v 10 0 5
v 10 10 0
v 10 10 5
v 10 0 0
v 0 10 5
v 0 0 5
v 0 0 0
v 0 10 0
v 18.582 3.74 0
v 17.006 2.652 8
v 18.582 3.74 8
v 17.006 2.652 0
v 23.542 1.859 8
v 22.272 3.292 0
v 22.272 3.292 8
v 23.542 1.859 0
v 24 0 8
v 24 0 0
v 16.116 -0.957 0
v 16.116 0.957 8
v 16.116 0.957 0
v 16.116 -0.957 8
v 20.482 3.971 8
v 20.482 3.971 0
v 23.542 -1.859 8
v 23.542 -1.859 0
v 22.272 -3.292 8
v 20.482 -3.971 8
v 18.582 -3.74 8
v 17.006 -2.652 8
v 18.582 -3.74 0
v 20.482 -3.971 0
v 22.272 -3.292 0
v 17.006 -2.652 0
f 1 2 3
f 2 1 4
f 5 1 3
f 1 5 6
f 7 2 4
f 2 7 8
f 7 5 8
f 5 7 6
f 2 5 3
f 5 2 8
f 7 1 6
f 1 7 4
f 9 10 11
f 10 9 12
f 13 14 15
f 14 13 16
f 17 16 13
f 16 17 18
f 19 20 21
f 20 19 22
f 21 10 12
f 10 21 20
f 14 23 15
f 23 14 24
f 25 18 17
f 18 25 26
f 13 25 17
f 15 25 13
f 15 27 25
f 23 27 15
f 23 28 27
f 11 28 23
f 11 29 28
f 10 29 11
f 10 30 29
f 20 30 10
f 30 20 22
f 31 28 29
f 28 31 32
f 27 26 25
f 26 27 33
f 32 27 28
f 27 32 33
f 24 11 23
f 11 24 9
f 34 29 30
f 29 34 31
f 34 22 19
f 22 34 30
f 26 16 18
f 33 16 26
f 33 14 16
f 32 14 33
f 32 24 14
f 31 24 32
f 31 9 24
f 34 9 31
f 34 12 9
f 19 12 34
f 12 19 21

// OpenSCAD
color("SteelBlue") cube([10, 10, 5]);
color("Orange") translate([20, 0, 0]) cylinder(h = 8, r = 4);
